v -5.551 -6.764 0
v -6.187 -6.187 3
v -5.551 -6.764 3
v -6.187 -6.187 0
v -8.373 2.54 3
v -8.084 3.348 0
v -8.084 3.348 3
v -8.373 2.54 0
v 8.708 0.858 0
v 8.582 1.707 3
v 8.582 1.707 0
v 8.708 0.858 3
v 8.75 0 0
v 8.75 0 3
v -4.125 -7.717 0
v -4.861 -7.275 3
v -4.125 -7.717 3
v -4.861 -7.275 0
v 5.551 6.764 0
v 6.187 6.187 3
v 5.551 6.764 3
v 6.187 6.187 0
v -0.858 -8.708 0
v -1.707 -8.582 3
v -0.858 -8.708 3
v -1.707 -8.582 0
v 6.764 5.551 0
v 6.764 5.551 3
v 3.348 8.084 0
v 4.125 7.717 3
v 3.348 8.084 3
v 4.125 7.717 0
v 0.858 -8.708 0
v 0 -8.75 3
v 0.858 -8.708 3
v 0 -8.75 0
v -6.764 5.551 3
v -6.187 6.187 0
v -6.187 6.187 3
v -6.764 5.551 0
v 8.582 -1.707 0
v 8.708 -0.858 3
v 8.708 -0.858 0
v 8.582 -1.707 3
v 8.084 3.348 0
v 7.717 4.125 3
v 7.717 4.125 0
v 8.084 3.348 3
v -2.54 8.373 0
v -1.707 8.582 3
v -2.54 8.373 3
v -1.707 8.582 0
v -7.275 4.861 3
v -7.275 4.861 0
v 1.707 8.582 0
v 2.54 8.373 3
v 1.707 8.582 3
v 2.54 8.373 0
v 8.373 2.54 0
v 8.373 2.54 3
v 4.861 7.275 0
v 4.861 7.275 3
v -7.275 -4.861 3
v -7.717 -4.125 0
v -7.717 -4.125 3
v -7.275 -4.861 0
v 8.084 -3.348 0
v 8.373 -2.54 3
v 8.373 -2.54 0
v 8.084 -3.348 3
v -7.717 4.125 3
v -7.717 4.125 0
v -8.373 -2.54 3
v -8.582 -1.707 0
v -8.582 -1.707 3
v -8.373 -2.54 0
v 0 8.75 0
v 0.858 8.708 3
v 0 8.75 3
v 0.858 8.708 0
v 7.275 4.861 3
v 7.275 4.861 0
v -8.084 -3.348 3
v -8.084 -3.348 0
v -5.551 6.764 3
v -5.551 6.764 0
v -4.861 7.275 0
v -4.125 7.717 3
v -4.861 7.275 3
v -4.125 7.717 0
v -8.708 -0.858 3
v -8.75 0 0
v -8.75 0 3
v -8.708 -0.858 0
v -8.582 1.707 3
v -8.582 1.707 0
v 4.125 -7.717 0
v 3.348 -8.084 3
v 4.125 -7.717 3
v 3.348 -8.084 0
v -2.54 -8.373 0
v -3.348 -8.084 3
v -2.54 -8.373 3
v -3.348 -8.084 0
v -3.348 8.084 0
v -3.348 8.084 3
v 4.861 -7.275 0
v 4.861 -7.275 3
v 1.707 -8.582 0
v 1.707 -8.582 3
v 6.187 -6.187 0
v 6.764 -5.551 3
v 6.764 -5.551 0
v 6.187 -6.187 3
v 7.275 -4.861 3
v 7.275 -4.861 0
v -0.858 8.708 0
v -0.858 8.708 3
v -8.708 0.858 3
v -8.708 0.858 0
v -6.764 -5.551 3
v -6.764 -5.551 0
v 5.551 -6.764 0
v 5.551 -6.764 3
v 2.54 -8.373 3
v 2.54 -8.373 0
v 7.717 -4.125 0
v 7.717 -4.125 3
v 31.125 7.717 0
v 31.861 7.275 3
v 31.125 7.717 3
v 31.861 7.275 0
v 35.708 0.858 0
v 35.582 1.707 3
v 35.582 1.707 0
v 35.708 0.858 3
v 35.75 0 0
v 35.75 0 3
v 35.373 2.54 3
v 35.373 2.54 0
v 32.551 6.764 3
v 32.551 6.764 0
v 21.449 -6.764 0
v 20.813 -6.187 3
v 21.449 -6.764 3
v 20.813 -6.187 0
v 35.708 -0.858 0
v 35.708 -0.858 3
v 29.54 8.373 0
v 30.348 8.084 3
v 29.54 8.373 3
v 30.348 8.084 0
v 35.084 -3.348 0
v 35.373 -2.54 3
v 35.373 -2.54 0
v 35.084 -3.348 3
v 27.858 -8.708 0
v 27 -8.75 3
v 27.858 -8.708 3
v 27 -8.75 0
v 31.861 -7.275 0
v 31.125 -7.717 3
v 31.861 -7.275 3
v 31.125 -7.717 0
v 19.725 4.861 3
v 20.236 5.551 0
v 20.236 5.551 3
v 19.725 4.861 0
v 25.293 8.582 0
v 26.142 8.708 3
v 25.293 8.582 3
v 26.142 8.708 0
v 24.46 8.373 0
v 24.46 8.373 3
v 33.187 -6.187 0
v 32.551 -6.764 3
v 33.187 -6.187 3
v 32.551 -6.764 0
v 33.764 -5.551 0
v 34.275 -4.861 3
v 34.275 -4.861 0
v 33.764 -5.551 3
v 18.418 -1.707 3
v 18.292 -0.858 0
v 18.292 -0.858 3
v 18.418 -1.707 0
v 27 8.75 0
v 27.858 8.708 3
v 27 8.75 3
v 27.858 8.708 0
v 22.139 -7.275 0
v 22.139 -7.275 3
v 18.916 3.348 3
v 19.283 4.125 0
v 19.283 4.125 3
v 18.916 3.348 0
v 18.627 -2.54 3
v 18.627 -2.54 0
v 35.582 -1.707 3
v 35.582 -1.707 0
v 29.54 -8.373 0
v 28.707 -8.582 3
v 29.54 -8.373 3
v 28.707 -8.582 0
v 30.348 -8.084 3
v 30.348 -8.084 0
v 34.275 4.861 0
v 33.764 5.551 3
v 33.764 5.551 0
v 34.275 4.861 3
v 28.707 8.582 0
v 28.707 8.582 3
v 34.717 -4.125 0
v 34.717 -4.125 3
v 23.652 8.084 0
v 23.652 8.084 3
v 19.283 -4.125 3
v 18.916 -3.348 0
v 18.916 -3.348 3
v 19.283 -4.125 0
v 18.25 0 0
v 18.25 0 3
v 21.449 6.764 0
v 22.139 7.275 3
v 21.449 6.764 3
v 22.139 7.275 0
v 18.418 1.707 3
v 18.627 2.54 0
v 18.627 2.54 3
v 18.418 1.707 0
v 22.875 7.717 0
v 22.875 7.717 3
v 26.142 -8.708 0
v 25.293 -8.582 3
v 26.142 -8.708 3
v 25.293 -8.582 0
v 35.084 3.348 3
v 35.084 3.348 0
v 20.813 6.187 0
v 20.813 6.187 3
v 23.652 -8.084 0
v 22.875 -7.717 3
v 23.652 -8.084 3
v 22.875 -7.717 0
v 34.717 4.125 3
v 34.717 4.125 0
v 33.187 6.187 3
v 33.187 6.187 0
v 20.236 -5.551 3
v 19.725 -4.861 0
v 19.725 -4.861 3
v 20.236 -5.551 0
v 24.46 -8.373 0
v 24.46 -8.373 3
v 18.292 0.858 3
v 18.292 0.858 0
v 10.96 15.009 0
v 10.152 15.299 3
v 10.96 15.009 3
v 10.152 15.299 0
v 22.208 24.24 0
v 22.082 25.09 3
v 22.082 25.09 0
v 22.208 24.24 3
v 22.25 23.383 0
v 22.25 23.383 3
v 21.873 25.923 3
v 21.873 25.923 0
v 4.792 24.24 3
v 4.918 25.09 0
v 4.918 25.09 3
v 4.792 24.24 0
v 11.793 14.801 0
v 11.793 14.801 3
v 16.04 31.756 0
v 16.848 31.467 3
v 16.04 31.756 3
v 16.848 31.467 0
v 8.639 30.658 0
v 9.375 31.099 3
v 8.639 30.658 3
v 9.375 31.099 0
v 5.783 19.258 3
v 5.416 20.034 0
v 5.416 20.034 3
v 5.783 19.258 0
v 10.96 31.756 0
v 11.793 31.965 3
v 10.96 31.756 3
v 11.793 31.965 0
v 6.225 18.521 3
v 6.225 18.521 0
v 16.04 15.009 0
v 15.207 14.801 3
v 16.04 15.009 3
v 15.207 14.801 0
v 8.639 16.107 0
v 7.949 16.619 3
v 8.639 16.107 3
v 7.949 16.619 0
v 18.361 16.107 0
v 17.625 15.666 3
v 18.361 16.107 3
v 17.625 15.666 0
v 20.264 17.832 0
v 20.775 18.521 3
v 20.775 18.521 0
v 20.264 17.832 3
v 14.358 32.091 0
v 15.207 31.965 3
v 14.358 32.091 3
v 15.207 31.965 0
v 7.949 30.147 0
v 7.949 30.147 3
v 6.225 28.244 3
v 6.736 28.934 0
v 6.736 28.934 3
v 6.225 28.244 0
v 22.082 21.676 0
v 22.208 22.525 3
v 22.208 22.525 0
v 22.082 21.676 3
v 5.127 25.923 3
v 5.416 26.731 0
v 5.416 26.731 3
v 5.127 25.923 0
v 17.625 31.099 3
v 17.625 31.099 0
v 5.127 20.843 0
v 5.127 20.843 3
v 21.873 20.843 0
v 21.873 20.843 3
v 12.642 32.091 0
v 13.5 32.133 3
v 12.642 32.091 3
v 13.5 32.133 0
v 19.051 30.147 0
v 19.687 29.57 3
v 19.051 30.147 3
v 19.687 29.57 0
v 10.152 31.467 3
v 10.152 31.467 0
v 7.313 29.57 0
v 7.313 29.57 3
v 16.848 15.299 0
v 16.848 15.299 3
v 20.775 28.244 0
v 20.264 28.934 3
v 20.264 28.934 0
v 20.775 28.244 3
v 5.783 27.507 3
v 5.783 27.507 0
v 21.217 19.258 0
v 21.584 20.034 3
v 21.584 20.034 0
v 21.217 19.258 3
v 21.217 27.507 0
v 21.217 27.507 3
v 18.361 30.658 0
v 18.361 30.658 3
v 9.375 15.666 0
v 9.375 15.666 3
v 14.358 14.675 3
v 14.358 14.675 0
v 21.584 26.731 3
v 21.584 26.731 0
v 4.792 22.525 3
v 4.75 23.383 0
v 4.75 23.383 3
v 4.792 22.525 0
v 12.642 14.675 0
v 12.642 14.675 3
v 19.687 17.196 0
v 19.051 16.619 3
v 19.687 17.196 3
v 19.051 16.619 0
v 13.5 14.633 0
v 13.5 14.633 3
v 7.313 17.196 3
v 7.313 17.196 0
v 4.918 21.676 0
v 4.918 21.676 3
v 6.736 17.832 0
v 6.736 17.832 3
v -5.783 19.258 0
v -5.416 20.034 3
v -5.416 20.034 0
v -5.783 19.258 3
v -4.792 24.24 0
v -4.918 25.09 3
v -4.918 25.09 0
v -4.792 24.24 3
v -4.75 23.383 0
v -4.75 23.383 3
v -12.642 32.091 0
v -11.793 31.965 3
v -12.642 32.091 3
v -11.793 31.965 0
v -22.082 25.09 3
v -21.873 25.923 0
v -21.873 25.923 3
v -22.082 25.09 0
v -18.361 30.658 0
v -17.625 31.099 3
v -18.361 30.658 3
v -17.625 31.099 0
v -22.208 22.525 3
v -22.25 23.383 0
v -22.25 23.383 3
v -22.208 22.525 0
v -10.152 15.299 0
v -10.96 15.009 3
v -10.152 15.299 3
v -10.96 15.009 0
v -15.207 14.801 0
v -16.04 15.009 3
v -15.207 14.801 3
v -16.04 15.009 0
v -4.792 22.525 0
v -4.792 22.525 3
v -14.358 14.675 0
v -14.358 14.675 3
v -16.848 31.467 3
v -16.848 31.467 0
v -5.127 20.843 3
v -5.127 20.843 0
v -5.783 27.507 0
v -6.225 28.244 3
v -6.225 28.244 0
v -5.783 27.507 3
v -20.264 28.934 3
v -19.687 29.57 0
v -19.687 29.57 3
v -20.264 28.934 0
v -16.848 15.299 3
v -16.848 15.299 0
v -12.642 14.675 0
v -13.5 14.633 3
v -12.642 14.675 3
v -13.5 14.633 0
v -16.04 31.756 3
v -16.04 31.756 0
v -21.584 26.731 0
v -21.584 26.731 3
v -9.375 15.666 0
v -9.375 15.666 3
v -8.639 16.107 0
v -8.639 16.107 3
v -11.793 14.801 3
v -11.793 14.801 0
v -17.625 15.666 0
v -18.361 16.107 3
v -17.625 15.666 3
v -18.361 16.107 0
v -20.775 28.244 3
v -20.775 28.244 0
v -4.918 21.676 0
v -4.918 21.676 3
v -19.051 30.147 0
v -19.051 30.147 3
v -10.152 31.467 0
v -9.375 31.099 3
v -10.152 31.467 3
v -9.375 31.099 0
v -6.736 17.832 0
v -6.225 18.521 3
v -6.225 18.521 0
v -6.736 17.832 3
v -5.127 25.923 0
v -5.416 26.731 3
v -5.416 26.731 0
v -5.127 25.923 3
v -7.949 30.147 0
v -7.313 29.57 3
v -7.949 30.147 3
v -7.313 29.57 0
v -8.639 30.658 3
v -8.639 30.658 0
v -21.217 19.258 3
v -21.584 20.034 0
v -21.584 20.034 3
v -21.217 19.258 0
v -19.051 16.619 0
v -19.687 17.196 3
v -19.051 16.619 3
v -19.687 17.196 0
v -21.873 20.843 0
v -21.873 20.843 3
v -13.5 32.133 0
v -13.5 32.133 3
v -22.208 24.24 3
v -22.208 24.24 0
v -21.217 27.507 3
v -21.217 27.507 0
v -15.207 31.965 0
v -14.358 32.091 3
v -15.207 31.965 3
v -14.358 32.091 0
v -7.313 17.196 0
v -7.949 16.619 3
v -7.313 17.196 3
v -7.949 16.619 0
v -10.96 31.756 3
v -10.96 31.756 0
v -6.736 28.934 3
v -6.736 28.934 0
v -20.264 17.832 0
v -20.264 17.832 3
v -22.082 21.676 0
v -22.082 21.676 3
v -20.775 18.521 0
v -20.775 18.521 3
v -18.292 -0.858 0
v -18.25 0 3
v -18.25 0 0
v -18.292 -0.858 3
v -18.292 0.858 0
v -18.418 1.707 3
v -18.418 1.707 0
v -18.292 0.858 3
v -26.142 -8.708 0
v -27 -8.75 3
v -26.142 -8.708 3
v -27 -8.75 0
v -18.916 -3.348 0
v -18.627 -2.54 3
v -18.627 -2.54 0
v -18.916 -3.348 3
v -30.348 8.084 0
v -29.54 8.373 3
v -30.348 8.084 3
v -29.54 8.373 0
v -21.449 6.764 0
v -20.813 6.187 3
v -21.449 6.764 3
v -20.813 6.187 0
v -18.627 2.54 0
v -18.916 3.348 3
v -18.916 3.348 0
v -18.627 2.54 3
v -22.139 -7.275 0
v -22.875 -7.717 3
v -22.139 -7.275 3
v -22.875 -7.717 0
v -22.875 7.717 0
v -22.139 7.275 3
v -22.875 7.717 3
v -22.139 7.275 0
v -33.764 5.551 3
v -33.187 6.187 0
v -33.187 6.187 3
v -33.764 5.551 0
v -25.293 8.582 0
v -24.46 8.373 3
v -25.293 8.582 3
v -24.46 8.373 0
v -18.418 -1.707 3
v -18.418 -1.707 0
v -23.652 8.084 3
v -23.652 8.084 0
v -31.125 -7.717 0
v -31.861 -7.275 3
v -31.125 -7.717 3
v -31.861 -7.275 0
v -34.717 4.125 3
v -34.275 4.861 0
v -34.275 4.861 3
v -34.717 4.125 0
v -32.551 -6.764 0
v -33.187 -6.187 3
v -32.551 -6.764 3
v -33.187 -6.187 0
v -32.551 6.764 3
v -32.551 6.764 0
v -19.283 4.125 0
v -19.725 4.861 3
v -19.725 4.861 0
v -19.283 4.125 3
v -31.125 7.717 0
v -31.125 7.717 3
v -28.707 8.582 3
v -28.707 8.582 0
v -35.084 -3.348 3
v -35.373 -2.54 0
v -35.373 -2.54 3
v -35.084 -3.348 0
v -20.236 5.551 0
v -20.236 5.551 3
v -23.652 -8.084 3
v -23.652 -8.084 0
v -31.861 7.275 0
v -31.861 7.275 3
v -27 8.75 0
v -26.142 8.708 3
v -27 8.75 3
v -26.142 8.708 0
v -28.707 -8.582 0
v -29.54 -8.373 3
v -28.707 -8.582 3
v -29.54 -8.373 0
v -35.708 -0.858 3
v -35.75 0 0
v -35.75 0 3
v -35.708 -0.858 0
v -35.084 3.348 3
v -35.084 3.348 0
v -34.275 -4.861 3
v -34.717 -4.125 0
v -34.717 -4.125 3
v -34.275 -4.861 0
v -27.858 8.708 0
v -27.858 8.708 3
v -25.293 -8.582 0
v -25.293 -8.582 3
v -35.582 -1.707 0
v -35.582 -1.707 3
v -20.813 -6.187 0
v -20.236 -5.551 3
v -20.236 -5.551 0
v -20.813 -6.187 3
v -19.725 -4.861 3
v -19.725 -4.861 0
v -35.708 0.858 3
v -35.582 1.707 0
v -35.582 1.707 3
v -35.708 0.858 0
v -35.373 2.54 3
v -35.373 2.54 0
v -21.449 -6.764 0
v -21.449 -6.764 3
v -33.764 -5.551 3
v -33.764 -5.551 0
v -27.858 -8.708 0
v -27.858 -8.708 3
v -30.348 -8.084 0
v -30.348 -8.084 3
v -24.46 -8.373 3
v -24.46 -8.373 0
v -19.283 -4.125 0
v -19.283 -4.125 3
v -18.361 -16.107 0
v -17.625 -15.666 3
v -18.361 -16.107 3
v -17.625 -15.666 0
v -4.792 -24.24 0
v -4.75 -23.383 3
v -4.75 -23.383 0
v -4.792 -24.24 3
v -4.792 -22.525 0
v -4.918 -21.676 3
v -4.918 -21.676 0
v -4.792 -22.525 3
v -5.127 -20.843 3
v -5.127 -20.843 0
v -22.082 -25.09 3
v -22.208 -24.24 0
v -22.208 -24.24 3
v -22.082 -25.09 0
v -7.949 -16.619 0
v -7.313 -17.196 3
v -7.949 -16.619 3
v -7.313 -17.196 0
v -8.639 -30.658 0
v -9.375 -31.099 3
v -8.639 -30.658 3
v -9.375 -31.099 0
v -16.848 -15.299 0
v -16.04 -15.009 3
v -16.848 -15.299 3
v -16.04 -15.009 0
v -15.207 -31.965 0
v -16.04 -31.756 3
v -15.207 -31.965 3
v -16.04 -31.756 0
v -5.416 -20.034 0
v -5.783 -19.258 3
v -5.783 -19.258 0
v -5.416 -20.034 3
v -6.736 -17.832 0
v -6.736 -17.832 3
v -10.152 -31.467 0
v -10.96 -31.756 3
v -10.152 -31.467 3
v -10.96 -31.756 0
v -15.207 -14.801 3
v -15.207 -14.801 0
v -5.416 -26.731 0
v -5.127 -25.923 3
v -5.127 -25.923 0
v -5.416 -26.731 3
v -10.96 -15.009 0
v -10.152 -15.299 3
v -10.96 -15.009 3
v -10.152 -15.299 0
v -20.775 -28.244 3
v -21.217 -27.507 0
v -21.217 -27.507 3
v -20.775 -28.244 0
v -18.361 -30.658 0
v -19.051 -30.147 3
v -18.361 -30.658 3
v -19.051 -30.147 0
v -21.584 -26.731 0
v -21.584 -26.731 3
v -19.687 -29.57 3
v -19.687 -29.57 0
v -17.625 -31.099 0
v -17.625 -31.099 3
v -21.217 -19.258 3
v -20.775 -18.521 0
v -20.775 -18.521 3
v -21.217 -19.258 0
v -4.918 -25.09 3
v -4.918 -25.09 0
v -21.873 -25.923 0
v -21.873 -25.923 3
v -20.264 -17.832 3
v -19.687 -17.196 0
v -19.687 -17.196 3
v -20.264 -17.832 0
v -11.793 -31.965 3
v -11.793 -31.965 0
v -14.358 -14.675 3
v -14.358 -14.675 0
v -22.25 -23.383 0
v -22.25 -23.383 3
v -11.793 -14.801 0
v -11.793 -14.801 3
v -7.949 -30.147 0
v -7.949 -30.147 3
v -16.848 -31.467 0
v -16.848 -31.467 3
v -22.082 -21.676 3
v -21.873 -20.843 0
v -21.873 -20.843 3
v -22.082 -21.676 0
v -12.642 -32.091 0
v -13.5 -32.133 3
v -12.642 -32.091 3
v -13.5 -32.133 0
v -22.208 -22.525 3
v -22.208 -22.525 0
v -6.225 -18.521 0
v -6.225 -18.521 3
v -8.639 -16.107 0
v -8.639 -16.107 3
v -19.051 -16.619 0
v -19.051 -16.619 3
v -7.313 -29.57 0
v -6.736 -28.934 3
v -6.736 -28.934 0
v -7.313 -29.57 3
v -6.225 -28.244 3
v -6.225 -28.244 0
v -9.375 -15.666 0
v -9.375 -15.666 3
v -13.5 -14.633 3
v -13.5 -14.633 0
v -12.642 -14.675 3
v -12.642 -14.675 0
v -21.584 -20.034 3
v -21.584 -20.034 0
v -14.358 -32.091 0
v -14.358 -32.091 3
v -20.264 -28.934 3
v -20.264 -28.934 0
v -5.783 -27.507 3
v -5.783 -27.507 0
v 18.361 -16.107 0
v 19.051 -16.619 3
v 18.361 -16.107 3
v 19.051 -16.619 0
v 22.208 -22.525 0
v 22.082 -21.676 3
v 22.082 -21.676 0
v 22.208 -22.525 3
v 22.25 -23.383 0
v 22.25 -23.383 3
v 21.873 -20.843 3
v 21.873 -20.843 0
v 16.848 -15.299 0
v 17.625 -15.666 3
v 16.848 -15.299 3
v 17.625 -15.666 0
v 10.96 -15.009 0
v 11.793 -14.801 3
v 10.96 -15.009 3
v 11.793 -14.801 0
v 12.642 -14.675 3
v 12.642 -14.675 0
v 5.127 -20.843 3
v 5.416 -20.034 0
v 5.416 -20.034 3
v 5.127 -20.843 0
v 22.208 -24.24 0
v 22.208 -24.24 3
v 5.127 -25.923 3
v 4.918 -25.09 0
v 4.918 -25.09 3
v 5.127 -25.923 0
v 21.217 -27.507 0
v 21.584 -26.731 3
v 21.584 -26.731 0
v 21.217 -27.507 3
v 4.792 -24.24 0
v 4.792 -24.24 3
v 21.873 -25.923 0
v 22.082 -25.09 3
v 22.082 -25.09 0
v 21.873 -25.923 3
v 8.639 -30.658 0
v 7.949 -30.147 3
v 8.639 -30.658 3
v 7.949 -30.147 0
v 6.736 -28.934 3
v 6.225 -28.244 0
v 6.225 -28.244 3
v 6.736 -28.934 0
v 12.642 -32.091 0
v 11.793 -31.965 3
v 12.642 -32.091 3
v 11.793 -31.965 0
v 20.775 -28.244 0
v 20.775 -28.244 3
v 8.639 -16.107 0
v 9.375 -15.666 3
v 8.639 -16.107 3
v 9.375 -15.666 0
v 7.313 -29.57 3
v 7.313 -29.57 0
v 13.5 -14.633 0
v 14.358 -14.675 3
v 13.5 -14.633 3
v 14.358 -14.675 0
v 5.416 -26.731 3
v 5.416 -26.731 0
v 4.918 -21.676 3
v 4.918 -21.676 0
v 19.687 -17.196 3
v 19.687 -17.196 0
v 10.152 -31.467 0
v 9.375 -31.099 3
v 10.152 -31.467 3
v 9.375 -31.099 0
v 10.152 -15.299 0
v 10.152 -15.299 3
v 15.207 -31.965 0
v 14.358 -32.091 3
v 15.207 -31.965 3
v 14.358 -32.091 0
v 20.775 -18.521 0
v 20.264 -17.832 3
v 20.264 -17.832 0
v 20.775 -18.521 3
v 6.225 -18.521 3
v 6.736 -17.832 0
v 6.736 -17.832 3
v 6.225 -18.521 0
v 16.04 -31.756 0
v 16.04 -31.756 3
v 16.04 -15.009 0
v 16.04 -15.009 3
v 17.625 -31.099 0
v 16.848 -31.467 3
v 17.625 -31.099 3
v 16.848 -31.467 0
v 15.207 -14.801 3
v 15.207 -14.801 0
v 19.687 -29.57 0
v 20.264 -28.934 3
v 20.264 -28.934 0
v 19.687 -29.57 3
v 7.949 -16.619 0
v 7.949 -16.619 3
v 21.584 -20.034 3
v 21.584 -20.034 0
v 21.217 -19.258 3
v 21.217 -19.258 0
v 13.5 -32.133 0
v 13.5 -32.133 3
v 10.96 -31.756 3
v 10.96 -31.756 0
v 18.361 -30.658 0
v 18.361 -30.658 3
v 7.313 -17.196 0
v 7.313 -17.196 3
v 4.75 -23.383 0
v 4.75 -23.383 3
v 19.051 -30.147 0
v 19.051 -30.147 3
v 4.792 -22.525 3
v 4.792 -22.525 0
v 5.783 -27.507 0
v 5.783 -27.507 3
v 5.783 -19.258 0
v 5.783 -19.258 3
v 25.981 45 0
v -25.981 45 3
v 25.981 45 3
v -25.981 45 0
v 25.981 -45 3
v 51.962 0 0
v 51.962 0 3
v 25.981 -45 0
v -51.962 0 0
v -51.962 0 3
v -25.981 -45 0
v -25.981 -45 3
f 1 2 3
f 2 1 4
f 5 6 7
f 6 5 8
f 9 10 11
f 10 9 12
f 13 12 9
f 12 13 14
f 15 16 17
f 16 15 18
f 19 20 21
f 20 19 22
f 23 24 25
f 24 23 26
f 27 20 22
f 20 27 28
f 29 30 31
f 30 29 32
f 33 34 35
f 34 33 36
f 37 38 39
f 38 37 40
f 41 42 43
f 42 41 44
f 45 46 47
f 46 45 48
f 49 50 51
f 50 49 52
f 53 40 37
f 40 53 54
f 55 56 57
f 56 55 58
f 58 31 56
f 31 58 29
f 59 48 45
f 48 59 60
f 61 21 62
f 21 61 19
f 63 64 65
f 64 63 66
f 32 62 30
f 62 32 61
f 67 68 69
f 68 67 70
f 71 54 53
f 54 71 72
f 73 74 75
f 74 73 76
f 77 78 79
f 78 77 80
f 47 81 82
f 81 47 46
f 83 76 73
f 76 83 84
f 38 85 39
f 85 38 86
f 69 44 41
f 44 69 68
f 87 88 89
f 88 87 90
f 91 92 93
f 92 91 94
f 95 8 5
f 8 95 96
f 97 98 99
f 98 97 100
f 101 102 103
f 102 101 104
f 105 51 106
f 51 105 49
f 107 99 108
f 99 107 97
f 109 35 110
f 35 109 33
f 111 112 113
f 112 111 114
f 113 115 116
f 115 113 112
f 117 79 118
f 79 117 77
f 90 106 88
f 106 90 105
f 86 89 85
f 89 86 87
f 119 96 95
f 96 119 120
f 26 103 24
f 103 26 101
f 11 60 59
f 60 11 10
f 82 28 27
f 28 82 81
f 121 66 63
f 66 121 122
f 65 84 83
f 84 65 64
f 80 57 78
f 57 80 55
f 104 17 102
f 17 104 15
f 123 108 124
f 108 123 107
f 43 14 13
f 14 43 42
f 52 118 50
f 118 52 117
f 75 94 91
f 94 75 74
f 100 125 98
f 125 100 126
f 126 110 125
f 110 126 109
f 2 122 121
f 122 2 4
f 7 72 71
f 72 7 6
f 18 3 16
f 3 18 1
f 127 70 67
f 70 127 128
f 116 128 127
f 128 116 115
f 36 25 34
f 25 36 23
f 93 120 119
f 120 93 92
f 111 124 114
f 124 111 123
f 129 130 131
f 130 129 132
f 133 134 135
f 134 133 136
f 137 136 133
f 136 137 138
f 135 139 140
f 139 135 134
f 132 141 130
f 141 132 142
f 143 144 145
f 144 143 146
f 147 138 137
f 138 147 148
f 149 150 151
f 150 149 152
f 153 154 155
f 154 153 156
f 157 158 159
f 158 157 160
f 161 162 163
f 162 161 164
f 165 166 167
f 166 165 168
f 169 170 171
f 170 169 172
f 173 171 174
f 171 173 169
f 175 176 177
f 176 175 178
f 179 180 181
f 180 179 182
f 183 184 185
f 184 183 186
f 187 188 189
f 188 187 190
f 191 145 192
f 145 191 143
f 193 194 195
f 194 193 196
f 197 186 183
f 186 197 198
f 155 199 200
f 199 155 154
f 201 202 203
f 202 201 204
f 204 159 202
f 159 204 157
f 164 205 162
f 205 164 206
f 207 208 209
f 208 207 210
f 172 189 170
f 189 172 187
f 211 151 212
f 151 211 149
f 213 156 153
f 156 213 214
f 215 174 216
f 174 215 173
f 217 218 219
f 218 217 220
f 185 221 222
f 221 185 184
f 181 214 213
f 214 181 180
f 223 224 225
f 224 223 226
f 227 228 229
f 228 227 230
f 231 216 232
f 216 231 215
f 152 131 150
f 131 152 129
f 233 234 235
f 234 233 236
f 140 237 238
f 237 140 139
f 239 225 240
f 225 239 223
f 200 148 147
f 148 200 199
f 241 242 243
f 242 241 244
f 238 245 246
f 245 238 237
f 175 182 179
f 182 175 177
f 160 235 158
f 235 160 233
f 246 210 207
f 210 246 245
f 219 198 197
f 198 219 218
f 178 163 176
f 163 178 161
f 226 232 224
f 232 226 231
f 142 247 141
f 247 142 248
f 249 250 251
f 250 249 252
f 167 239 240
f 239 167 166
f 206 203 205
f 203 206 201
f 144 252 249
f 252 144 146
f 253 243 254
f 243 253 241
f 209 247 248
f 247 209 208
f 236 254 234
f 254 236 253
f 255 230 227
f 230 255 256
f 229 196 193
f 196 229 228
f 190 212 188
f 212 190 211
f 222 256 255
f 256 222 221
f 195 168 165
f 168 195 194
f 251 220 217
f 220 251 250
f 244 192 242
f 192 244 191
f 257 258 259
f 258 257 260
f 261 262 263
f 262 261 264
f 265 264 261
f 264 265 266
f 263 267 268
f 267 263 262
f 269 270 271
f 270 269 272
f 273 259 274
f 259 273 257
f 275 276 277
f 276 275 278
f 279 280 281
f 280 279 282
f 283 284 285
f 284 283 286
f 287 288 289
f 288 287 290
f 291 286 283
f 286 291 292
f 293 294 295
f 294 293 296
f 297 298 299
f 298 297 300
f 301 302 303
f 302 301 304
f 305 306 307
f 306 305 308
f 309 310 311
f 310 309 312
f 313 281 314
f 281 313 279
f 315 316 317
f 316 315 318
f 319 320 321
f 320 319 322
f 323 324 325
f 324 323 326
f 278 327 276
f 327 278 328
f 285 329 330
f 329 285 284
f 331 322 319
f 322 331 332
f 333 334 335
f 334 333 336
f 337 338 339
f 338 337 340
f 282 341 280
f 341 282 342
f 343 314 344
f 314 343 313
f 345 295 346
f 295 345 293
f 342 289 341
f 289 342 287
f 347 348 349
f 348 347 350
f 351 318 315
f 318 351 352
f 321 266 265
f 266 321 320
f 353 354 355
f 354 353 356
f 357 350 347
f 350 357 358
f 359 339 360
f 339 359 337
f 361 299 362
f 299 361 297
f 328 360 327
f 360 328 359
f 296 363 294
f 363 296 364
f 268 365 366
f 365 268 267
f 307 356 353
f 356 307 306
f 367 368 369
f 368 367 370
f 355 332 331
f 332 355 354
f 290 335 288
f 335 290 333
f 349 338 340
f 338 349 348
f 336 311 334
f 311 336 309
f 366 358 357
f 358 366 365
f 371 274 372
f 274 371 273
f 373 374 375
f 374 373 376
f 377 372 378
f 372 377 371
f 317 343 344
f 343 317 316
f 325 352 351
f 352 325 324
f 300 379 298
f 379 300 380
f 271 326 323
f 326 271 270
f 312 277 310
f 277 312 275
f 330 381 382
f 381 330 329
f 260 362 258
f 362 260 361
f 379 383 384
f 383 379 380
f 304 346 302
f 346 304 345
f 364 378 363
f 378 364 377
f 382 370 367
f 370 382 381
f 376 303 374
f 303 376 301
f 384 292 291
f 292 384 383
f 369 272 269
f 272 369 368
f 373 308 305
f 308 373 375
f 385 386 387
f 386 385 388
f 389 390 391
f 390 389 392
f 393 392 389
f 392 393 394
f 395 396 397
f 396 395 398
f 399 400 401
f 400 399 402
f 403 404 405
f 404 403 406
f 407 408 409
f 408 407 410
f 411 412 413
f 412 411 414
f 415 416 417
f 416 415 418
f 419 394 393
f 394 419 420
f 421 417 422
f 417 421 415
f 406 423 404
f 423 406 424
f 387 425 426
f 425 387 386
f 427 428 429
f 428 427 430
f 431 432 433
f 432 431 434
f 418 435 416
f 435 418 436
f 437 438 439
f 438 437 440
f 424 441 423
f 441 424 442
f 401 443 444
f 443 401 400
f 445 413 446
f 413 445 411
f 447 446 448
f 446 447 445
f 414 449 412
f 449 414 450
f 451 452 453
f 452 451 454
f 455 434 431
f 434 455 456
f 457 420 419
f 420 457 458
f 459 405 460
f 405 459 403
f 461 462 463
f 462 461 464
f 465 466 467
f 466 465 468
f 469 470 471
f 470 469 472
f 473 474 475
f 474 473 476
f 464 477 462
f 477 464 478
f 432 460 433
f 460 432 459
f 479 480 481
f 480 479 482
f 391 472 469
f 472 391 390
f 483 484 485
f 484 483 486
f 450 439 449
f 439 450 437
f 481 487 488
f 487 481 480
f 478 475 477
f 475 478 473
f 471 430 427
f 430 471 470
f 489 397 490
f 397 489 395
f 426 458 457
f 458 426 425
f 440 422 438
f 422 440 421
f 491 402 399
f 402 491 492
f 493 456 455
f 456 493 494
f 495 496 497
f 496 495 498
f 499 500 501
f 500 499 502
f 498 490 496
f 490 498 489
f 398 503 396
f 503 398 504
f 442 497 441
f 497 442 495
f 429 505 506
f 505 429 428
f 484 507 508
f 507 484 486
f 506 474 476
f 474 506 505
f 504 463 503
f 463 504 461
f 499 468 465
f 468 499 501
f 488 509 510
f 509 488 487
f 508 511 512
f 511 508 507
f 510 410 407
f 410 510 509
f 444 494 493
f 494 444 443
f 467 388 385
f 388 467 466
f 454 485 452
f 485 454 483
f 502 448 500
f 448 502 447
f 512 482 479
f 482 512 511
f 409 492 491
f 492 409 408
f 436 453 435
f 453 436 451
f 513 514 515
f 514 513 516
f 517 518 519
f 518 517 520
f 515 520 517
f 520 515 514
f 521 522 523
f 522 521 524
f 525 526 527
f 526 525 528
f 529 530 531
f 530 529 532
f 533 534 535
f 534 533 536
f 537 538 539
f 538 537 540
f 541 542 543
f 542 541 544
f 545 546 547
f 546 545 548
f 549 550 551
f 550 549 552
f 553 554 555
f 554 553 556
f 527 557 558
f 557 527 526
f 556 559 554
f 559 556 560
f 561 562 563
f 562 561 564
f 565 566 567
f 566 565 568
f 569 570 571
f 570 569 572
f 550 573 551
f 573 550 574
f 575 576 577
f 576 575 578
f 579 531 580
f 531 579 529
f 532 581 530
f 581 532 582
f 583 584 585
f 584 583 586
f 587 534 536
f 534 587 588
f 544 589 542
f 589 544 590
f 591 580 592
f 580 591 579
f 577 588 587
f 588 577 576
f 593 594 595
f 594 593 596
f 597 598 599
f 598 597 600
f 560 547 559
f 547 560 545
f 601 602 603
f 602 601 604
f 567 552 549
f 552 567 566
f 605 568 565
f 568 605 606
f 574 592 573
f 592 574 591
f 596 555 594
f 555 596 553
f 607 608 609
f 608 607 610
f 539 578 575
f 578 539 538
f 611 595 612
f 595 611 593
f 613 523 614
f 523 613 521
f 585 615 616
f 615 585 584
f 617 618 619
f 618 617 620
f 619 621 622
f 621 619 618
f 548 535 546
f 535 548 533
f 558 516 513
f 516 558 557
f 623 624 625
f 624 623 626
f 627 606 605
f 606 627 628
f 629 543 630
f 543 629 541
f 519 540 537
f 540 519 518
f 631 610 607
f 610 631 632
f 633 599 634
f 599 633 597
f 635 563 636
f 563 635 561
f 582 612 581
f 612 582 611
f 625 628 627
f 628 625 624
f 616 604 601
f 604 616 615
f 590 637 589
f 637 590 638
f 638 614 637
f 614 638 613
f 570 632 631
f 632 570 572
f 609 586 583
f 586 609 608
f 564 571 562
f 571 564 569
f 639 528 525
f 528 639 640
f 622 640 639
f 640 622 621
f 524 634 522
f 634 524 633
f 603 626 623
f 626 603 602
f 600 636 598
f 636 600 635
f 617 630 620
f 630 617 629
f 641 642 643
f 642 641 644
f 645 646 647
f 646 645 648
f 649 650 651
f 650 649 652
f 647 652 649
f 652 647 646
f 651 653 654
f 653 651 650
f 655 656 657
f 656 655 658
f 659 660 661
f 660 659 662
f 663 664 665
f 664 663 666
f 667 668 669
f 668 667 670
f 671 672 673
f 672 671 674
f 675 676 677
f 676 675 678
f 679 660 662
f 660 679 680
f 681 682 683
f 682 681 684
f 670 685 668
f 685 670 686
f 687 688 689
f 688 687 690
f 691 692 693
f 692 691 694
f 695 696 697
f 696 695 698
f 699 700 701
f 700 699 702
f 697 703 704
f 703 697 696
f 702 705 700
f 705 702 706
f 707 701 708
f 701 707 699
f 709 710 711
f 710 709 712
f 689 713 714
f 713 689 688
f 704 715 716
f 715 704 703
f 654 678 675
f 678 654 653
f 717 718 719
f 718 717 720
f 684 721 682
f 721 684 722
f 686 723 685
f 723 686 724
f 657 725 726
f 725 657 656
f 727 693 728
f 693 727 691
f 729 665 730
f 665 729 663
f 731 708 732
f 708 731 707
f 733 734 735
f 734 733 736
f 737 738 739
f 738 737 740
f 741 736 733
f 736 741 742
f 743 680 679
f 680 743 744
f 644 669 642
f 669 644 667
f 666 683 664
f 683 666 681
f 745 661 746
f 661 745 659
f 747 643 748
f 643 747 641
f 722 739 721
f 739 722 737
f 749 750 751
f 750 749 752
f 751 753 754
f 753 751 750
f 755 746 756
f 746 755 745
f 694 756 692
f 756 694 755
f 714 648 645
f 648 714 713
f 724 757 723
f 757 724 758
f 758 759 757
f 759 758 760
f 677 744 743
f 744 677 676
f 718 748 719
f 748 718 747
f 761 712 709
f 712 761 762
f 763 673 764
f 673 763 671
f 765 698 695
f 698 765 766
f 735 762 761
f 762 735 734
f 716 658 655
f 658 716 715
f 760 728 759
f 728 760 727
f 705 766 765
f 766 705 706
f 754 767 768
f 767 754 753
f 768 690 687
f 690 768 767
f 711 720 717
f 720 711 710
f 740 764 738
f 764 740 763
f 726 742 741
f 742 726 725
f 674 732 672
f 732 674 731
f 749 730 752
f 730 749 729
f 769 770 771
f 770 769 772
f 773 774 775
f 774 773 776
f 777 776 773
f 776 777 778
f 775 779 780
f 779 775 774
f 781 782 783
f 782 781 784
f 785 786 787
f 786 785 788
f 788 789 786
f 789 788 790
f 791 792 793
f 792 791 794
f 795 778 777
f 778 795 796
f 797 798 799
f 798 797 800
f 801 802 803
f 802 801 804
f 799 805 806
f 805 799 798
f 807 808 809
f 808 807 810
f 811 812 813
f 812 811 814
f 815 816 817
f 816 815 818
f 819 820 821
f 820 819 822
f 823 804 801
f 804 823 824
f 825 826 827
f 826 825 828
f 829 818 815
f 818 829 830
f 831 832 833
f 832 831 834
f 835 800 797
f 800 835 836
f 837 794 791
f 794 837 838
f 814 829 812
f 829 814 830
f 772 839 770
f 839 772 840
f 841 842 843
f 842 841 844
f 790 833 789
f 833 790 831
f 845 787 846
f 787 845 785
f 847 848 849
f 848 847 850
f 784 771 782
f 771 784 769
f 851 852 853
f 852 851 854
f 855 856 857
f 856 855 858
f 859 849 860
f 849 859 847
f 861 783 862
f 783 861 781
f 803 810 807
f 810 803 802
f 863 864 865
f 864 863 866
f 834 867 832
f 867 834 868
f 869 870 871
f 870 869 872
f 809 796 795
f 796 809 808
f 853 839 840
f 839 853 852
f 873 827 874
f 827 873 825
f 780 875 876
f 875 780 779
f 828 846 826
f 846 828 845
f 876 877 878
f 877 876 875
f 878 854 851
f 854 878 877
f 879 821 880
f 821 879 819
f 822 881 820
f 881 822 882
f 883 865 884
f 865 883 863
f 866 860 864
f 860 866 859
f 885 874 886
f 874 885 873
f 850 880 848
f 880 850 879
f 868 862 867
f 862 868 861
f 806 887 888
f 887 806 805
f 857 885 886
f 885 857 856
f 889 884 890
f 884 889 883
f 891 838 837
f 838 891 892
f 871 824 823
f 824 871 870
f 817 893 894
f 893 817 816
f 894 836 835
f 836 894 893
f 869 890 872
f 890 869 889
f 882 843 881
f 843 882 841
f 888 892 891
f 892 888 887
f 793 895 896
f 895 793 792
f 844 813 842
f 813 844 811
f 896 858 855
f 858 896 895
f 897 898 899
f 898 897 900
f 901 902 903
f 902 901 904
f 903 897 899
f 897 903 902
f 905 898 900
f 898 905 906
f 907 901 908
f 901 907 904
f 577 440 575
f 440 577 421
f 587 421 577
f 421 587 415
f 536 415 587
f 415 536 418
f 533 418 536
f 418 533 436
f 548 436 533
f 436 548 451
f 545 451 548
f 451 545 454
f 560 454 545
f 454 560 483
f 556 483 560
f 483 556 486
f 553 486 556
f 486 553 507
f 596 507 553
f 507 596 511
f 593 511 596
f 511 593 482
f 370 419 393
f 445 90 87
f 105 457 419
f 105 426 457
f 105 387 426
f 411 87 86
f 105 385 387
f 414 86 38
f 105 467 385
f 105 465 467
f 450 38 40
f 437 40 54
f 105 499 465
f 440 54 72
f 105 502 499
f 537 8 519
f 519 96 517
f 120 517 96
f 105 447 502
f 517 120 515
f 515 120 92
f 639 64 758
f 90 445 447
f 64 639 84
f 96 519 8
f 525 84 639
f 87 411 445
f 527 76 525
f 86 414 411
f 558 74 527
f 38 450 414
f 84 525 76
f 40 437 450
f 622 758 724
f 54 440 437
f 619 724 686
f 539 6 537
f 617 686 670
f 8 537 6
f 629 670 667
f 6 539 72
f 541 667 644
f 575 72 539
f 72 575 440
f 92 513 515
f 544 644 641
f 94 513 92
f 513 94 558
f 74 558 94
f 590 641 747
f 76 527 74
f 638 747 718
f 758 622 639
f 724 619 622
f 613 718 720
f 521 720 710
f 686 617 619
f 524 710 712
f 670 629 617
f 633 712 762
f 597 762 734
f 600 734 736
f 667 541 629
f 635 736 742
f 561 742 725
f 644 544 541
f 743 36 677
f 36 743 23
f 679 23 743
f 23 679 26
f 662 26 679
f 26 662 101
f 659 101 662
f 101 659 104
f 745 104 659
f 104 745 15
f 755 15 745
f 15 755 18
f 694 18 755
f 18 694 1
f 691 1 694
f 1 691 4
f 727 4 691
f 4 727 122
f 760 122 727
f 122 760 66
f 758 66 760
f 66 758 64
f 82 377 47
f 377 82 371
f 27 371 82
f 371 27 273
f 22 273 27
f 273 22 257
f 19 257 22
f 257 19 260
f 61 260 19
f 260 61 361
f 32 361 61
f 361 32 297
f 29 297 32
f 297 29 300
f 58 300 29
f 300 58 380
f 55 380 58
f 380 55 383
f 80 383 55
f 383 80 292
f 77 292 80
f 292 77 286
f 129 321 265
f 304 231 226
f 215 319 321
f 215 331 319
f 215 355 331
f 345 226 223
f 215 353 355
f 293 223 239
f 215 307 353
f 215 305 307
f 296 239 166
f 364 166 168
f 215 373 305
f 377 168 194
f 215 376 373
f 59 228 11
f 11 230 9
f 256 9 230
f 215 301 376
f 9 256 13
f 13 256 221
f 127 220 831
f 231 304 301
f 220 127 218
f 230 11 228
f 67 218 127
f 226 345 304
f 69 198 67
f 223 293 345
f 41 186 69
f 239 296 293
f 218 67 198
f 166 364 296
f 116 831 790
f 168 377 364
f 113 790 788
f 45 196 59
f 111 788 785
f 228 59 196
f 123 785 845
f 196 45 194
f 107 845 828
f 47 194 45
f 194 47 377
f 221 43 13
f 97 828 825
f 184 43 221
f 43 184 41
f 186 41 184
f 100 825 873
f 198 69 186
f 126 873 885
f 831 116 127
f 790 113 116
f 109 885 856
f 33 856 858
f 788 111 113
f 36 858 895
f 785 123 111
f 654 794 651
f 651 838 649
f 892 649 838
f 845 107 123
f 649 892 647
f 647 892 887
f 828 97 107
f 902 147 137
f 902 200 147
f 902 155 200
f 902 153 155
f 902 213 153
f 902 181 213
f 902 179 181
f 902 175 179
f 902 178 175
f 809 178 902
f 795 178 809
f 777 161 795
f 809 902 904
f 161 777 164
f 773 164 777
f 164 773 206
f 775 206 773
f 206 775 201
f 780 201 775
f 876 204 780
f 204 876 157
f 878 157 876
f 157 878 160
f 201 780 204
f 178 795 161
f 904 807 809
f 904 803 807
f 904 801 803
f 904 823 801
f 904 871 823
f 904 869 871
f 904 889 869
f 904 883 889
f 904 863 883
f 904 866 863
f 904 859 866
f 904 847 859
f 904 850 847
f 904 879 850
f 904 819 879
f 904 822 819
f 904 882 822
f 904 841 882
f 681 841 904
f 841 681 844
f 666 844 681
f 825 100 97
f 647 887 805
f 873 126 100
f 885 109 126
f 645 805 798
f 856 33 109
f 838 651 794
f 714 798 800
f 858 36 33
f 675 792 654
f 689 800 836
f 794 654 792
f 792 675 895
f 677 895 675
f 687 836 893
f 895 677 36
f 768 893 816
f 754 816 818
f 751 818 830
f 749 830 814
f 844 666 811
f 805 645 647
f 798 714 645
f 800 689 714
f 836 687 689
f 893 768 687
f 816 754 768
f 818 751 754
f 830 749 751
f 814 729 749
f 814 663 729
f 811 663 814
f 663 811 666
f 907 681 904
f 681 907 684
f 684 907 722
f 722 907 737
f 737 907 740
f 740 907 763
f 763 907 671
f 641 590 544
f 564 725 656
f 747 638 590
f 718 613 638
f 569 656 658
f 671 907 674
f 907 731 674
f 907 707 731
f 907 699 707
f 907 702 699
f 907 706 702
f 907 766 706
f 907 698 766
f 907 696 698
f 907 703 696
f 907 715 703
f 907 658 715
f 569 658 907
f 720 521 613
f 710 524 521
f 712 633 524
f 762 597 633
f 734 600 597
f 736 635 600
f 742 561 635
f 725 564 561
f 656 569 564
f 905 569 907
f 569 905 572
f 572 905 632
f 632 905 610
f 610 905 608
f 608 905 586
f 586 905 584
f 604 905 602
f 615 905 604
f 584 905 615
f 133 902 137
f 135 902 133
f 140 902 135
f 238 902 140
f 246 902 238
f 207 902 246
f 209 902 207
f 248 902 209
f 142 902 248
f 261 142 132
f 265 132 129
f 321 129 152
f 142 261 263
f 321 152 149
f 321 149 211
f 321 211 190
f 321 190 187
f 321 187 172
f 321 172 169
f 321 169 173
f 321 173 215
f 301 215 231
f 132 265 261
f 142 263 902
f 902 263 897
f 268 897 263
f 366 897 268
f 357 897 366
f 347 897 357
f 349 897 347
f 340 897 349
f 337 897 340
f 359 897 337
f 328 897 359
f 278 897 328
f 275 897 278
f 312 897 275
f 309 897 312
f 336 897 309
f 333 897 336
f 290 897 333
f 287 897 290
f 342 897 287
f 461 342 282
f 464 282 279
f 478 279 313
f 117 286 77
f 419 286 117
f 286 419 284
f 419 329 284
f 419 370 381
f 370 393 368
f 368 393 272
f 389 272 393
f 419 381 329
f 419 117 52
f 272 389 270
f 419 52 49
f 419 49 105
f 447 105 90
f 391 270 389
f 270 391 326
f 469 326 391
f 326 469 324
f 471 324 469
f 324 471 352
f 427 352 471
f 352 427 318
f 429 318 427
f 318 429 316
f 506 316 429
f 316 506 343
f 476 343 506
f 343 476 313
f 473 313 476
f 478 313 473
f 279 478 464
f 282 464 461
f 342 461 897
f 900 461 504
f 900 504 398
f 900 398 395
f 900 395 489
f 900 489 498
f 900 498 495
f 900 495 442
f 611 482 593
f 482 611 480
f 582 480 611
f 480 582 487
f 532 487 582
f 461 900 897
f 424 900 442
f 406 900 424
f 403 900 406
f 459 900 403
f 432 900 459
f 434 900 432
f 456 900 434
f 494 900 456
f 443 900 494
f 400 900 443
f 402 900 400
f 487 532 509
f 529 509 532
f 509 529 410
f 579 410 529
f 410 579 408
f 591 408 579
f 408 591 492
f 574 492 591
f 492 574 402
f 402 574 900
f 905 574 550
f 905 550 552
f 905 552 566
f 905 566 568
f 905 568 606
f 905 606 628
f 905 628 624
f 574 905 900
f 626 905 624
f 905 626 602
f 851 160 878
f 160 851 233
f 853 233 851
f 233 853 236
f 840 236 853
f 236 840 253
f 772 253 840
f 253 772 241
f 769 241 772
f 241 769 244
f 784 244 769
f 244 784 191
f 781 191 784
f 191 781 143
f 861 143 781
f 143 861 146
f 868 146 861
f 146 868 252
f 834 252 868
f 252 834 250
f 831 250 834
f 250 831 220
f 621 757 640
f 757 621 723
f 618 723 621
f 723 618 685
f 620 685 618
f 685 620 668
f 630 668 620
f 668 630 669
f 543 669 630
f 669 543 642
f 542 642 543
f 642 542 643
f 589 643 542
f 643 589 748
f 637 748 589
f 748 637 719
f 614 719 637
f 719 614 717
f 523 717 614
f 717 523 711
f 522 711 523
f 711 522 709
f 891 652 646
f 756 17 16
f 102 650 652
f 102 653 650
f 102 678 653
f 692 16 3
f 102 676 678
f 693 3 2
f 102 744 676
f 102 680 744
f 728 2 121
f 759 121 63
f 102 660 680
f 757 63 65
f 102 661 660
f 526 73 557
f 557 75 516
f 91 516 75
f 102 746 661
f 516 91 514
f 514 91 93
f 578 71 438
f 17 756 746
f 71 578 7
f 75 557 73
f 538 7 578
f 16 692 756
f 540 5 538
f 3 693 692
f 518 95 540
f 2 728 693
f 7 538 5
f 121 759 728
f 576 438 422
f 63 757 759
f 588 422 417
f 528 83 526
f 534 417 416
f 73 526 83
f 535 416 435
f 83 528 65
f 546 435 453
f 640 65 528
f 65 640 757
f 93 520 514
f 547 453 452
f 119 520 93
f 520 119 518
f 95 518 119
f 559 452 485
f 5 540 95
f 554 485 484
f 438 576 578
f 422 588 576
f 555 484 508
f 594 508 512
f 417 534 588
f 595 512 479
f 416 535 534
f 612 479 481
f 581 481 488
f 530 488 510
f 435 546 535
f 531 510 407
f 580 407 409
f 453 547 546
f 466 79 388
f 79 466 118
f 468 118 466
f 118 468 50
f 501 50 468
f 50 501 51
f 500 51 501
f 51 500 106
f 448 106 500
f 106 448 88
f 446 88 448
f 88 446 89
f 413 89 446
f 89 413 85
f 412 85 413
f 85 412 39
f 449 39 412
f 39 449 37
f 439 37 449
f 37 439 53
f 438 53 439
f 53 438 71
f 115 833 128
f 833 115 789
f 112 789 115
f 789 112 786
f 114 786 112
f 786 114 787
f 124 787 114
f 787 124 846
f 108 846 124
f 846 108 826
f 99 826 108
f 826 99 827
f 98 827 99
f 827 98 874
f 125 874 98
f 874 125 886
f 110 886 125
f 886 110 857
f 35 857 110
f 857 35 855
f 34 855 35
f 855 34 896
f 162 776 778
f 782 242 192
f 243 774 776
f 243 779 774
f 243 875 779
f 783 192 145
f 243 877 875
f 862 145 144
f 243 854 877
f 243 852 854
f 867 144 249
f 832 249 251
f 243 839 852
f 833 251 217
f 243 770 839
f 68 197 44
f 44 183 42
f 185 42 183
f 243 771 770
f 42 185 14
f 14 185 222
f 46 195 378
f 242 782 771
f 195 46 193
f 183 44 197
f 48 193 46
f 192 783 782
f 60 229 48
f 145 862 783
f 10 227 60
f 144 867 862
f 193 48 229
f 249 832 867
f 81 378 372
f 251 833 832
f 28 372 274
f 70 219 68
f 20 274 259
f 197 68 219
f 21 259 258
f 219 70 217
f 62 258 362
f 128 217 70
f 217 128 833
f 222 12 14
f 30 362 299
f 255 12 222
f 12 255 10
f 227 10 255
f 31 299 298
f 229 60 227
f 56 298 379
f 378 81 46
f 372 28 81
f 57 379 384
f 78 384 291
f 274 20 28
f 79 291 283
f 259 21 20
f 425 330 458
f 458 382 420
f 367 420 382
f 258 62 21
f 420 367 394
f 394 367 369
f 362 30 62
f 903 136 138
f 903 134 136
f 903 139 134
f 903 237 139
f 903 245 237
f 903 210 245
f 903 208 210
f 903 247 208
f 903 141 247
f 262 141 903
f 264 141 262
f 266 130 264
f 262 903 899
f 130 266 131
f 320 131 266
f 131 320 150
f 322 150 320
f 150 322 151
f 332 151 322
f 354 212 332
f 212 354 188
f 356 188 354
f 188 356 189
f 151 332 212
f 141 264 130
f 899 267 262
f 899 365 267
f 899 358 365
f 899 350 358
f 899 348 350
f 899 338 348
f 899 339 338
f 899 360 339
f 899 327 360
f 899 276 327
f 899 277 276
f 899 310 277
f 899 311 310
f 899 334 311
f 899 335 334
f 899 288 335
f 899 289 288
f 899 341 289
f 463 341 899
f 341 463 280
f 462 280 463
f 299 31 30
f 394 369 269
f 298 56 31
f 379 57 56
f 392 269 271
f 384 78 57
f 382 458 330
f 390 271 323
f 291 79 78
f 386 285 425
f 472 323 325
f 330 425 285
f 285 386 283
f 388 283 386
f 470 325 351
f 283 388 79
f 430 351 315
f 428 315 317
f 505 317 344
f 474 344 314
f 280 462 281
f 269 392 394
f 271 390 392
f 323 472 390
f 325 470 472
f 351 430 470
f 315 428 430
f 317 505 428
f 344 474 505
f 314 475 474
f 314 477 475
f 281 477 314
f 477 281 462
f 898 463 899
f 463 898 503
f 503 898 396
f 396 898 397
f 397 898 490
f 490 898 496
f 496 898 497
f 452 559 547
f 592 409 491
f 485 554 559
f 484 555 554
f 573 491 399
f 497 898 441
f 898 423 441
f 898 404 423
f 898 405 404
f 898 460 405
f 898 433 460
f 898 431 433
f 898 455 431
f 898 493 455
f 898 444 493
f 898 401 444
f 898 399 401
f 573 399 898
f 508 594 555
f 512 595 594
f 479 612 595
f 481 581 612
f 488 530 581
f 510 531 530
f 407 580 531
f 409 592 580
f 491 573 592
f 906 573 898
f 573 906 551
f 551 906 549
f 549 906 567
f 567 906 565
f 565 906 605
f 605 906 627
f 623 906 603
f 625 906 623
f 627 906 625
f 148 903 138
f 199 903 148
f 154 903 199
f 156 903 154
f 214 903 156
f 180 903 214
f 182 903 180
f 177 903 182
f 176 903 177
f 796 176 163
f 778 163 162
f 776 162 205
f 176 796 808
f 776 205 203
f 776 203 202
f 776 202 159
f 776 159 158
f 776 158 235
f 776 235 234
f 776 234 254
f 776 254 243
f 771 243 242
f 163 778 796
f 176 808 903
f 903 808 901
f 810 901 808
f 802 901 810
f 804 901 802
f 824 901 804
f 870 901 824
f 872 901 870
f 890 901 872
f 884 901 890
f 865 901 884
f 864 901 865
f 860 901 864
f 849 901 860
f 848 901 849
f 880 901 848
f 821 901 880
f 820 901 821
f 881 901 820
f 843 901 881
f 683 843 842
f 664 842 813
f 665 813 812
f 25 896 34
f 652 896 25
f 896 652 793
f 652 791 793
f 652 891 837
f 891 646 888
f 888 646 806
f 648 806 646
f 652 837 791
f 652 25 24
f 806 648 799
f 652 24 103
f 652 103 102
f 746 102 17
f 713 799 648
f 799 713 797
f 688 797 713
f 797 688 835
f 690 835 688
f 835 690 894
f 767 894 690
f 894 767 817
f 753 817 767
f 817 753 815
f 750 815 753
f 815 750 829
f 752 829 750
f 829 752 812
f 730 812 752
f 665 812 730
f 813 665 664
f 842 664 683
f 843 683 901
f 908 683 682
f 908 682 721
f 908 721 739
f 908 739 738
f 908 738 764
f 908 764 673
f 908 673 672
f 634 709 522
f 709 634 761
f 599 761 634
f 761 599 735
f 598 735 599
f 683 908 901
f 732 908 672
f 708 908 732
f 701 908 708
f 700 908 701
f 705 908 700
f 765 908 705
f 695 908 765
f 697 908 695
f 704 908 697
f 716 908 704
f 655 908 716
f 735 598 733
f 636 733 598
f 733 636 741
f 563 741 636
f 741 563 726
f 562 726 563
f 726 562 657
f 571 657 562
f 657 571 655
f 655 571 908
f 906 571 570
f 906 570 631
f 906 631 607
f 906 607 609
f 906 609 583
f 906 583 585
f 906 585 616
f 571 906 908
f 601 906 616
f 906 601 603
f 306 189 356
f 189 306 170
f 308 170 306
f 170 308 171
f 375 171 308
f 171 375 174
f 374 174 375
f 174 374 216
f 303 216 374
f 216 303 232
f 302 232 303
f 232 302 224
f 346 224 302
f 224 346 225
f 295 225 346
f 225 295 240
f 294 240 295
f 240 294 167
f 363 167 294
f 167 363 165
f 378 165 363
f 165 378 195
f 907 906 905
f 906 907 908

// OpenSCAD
// Float for 7 x 15 mL conical tubes, printed upside down (plate on bed, z=0..3)
$fn = 64;

// Plate (regular hexagon, 90 mm across flats, two flats parallel to X)
plate_af   = 90;   // across flats
plate_t    = 3;    // plate thickness (z 0..3)
plate_ap   = plate_af / 2;   // apothem = 45
plate_r    = plate_af / sqrt(3); // circumradius = 51.9615

// Holes: 17.5 mm through, 1 centre + 6 on 54 mm dia circle (first on +X)
hole_d     = 17.5;
hole_r     = hole_d / 2;   // 8.75
ring_d     = 54;
ring_r     = ring_d / 2;   // 27

// Sleeves: 2 mm wall -> 21.5 mm OD, rise to z=20
sleeve_od  = 21.5;
sleeve_r   = sleeve_od / 2; // 10.75
sleeve_h   = 20;

// Hexagonal skirt: 2 mm wall, 84 mm across flats outside (3 mm in from plate edge)
skirt_af   = 84;
skirt_ap   = skirt_af / 2;  // 42
skirt_r    = skirt_af / sqrt(3); // 48.4973
skirt_h    = 20;

// Helper: regular hexagon polygon (flat sides parallel to X, vertices at 0,60,...)
module hexagon(r) {
    polygon(points = [for (i = [0:5]) [r * cos(i * 60), r * sin(i * 60)]]);
}

// Hole centre positions (centre + 6 on 54 mm dia circle, first on +X)
hole_pos = [
    [0, 0],
    [ring_r, 0],
    [ring_r * cos(60),  ring_r * sin(60)],
    [ring_r * cos(120), ring_r * sin(120)],
    [ring_r * cos(180), ring_r * sin(180)],
    [ring_r * cos(240), ring_r * sin(240)],
    [ring_r * cos(300), ring_r * sin(300)]
];

// Cuts: each extends 1 mm past the faces it cuts (z -1 .. 21)
module hole_cut() {
    translate([0, 0, -1])
        cylinder(h = 22, r = hole_r, $fn = 64);
}

module sleeve_cut() {
    translate([0, 0, -1])
        cylinder(h = 22, r = sleeve_r, $fn = 64);
}

module skirt_cut() {
    translate([0, 0, -1])
        linear_extrude(height = 22)
            hexagon(skirt_r);
}

// Bored plate: plate minus 7 through-holes (skirt bore NOT applied here,
// so it cannot swallow the sleeves that sit inside the skirt)
module bored_plate() {
    difference() {
        translate([0, 0, 0])
            linear_extrude(height = plate_t)
                hexagon(plate_r);
        for (p = hole_pos)
            translate([p[0], p[1], 0])
                hole_cut();
    }
}

// Final float:
//  1) plate with 7 through-holes
//  2) 7 sleeves (21.5 OD, z 0..20) each bored to 17.5
//  3) hexagonal skirt (84 AF, z 0..20) bored to 84 AF (cuts only the plate rim)
union() {
    bored_plate();

    for (p = hole_pos)
        difference() {
            translate([p[0], p[1], 0])
                cylinder(h = sleeve_h, r = sleeve_r, $fn = 64);
            translate([p[0], p[1], 0])
                sleeve_cut();
        }

    difference() {
        translate([0, 0, 0])
            linear_extrude(height = skirt_h)
                hexagon(skirt_r);
        skirt_cut();
    }
}
